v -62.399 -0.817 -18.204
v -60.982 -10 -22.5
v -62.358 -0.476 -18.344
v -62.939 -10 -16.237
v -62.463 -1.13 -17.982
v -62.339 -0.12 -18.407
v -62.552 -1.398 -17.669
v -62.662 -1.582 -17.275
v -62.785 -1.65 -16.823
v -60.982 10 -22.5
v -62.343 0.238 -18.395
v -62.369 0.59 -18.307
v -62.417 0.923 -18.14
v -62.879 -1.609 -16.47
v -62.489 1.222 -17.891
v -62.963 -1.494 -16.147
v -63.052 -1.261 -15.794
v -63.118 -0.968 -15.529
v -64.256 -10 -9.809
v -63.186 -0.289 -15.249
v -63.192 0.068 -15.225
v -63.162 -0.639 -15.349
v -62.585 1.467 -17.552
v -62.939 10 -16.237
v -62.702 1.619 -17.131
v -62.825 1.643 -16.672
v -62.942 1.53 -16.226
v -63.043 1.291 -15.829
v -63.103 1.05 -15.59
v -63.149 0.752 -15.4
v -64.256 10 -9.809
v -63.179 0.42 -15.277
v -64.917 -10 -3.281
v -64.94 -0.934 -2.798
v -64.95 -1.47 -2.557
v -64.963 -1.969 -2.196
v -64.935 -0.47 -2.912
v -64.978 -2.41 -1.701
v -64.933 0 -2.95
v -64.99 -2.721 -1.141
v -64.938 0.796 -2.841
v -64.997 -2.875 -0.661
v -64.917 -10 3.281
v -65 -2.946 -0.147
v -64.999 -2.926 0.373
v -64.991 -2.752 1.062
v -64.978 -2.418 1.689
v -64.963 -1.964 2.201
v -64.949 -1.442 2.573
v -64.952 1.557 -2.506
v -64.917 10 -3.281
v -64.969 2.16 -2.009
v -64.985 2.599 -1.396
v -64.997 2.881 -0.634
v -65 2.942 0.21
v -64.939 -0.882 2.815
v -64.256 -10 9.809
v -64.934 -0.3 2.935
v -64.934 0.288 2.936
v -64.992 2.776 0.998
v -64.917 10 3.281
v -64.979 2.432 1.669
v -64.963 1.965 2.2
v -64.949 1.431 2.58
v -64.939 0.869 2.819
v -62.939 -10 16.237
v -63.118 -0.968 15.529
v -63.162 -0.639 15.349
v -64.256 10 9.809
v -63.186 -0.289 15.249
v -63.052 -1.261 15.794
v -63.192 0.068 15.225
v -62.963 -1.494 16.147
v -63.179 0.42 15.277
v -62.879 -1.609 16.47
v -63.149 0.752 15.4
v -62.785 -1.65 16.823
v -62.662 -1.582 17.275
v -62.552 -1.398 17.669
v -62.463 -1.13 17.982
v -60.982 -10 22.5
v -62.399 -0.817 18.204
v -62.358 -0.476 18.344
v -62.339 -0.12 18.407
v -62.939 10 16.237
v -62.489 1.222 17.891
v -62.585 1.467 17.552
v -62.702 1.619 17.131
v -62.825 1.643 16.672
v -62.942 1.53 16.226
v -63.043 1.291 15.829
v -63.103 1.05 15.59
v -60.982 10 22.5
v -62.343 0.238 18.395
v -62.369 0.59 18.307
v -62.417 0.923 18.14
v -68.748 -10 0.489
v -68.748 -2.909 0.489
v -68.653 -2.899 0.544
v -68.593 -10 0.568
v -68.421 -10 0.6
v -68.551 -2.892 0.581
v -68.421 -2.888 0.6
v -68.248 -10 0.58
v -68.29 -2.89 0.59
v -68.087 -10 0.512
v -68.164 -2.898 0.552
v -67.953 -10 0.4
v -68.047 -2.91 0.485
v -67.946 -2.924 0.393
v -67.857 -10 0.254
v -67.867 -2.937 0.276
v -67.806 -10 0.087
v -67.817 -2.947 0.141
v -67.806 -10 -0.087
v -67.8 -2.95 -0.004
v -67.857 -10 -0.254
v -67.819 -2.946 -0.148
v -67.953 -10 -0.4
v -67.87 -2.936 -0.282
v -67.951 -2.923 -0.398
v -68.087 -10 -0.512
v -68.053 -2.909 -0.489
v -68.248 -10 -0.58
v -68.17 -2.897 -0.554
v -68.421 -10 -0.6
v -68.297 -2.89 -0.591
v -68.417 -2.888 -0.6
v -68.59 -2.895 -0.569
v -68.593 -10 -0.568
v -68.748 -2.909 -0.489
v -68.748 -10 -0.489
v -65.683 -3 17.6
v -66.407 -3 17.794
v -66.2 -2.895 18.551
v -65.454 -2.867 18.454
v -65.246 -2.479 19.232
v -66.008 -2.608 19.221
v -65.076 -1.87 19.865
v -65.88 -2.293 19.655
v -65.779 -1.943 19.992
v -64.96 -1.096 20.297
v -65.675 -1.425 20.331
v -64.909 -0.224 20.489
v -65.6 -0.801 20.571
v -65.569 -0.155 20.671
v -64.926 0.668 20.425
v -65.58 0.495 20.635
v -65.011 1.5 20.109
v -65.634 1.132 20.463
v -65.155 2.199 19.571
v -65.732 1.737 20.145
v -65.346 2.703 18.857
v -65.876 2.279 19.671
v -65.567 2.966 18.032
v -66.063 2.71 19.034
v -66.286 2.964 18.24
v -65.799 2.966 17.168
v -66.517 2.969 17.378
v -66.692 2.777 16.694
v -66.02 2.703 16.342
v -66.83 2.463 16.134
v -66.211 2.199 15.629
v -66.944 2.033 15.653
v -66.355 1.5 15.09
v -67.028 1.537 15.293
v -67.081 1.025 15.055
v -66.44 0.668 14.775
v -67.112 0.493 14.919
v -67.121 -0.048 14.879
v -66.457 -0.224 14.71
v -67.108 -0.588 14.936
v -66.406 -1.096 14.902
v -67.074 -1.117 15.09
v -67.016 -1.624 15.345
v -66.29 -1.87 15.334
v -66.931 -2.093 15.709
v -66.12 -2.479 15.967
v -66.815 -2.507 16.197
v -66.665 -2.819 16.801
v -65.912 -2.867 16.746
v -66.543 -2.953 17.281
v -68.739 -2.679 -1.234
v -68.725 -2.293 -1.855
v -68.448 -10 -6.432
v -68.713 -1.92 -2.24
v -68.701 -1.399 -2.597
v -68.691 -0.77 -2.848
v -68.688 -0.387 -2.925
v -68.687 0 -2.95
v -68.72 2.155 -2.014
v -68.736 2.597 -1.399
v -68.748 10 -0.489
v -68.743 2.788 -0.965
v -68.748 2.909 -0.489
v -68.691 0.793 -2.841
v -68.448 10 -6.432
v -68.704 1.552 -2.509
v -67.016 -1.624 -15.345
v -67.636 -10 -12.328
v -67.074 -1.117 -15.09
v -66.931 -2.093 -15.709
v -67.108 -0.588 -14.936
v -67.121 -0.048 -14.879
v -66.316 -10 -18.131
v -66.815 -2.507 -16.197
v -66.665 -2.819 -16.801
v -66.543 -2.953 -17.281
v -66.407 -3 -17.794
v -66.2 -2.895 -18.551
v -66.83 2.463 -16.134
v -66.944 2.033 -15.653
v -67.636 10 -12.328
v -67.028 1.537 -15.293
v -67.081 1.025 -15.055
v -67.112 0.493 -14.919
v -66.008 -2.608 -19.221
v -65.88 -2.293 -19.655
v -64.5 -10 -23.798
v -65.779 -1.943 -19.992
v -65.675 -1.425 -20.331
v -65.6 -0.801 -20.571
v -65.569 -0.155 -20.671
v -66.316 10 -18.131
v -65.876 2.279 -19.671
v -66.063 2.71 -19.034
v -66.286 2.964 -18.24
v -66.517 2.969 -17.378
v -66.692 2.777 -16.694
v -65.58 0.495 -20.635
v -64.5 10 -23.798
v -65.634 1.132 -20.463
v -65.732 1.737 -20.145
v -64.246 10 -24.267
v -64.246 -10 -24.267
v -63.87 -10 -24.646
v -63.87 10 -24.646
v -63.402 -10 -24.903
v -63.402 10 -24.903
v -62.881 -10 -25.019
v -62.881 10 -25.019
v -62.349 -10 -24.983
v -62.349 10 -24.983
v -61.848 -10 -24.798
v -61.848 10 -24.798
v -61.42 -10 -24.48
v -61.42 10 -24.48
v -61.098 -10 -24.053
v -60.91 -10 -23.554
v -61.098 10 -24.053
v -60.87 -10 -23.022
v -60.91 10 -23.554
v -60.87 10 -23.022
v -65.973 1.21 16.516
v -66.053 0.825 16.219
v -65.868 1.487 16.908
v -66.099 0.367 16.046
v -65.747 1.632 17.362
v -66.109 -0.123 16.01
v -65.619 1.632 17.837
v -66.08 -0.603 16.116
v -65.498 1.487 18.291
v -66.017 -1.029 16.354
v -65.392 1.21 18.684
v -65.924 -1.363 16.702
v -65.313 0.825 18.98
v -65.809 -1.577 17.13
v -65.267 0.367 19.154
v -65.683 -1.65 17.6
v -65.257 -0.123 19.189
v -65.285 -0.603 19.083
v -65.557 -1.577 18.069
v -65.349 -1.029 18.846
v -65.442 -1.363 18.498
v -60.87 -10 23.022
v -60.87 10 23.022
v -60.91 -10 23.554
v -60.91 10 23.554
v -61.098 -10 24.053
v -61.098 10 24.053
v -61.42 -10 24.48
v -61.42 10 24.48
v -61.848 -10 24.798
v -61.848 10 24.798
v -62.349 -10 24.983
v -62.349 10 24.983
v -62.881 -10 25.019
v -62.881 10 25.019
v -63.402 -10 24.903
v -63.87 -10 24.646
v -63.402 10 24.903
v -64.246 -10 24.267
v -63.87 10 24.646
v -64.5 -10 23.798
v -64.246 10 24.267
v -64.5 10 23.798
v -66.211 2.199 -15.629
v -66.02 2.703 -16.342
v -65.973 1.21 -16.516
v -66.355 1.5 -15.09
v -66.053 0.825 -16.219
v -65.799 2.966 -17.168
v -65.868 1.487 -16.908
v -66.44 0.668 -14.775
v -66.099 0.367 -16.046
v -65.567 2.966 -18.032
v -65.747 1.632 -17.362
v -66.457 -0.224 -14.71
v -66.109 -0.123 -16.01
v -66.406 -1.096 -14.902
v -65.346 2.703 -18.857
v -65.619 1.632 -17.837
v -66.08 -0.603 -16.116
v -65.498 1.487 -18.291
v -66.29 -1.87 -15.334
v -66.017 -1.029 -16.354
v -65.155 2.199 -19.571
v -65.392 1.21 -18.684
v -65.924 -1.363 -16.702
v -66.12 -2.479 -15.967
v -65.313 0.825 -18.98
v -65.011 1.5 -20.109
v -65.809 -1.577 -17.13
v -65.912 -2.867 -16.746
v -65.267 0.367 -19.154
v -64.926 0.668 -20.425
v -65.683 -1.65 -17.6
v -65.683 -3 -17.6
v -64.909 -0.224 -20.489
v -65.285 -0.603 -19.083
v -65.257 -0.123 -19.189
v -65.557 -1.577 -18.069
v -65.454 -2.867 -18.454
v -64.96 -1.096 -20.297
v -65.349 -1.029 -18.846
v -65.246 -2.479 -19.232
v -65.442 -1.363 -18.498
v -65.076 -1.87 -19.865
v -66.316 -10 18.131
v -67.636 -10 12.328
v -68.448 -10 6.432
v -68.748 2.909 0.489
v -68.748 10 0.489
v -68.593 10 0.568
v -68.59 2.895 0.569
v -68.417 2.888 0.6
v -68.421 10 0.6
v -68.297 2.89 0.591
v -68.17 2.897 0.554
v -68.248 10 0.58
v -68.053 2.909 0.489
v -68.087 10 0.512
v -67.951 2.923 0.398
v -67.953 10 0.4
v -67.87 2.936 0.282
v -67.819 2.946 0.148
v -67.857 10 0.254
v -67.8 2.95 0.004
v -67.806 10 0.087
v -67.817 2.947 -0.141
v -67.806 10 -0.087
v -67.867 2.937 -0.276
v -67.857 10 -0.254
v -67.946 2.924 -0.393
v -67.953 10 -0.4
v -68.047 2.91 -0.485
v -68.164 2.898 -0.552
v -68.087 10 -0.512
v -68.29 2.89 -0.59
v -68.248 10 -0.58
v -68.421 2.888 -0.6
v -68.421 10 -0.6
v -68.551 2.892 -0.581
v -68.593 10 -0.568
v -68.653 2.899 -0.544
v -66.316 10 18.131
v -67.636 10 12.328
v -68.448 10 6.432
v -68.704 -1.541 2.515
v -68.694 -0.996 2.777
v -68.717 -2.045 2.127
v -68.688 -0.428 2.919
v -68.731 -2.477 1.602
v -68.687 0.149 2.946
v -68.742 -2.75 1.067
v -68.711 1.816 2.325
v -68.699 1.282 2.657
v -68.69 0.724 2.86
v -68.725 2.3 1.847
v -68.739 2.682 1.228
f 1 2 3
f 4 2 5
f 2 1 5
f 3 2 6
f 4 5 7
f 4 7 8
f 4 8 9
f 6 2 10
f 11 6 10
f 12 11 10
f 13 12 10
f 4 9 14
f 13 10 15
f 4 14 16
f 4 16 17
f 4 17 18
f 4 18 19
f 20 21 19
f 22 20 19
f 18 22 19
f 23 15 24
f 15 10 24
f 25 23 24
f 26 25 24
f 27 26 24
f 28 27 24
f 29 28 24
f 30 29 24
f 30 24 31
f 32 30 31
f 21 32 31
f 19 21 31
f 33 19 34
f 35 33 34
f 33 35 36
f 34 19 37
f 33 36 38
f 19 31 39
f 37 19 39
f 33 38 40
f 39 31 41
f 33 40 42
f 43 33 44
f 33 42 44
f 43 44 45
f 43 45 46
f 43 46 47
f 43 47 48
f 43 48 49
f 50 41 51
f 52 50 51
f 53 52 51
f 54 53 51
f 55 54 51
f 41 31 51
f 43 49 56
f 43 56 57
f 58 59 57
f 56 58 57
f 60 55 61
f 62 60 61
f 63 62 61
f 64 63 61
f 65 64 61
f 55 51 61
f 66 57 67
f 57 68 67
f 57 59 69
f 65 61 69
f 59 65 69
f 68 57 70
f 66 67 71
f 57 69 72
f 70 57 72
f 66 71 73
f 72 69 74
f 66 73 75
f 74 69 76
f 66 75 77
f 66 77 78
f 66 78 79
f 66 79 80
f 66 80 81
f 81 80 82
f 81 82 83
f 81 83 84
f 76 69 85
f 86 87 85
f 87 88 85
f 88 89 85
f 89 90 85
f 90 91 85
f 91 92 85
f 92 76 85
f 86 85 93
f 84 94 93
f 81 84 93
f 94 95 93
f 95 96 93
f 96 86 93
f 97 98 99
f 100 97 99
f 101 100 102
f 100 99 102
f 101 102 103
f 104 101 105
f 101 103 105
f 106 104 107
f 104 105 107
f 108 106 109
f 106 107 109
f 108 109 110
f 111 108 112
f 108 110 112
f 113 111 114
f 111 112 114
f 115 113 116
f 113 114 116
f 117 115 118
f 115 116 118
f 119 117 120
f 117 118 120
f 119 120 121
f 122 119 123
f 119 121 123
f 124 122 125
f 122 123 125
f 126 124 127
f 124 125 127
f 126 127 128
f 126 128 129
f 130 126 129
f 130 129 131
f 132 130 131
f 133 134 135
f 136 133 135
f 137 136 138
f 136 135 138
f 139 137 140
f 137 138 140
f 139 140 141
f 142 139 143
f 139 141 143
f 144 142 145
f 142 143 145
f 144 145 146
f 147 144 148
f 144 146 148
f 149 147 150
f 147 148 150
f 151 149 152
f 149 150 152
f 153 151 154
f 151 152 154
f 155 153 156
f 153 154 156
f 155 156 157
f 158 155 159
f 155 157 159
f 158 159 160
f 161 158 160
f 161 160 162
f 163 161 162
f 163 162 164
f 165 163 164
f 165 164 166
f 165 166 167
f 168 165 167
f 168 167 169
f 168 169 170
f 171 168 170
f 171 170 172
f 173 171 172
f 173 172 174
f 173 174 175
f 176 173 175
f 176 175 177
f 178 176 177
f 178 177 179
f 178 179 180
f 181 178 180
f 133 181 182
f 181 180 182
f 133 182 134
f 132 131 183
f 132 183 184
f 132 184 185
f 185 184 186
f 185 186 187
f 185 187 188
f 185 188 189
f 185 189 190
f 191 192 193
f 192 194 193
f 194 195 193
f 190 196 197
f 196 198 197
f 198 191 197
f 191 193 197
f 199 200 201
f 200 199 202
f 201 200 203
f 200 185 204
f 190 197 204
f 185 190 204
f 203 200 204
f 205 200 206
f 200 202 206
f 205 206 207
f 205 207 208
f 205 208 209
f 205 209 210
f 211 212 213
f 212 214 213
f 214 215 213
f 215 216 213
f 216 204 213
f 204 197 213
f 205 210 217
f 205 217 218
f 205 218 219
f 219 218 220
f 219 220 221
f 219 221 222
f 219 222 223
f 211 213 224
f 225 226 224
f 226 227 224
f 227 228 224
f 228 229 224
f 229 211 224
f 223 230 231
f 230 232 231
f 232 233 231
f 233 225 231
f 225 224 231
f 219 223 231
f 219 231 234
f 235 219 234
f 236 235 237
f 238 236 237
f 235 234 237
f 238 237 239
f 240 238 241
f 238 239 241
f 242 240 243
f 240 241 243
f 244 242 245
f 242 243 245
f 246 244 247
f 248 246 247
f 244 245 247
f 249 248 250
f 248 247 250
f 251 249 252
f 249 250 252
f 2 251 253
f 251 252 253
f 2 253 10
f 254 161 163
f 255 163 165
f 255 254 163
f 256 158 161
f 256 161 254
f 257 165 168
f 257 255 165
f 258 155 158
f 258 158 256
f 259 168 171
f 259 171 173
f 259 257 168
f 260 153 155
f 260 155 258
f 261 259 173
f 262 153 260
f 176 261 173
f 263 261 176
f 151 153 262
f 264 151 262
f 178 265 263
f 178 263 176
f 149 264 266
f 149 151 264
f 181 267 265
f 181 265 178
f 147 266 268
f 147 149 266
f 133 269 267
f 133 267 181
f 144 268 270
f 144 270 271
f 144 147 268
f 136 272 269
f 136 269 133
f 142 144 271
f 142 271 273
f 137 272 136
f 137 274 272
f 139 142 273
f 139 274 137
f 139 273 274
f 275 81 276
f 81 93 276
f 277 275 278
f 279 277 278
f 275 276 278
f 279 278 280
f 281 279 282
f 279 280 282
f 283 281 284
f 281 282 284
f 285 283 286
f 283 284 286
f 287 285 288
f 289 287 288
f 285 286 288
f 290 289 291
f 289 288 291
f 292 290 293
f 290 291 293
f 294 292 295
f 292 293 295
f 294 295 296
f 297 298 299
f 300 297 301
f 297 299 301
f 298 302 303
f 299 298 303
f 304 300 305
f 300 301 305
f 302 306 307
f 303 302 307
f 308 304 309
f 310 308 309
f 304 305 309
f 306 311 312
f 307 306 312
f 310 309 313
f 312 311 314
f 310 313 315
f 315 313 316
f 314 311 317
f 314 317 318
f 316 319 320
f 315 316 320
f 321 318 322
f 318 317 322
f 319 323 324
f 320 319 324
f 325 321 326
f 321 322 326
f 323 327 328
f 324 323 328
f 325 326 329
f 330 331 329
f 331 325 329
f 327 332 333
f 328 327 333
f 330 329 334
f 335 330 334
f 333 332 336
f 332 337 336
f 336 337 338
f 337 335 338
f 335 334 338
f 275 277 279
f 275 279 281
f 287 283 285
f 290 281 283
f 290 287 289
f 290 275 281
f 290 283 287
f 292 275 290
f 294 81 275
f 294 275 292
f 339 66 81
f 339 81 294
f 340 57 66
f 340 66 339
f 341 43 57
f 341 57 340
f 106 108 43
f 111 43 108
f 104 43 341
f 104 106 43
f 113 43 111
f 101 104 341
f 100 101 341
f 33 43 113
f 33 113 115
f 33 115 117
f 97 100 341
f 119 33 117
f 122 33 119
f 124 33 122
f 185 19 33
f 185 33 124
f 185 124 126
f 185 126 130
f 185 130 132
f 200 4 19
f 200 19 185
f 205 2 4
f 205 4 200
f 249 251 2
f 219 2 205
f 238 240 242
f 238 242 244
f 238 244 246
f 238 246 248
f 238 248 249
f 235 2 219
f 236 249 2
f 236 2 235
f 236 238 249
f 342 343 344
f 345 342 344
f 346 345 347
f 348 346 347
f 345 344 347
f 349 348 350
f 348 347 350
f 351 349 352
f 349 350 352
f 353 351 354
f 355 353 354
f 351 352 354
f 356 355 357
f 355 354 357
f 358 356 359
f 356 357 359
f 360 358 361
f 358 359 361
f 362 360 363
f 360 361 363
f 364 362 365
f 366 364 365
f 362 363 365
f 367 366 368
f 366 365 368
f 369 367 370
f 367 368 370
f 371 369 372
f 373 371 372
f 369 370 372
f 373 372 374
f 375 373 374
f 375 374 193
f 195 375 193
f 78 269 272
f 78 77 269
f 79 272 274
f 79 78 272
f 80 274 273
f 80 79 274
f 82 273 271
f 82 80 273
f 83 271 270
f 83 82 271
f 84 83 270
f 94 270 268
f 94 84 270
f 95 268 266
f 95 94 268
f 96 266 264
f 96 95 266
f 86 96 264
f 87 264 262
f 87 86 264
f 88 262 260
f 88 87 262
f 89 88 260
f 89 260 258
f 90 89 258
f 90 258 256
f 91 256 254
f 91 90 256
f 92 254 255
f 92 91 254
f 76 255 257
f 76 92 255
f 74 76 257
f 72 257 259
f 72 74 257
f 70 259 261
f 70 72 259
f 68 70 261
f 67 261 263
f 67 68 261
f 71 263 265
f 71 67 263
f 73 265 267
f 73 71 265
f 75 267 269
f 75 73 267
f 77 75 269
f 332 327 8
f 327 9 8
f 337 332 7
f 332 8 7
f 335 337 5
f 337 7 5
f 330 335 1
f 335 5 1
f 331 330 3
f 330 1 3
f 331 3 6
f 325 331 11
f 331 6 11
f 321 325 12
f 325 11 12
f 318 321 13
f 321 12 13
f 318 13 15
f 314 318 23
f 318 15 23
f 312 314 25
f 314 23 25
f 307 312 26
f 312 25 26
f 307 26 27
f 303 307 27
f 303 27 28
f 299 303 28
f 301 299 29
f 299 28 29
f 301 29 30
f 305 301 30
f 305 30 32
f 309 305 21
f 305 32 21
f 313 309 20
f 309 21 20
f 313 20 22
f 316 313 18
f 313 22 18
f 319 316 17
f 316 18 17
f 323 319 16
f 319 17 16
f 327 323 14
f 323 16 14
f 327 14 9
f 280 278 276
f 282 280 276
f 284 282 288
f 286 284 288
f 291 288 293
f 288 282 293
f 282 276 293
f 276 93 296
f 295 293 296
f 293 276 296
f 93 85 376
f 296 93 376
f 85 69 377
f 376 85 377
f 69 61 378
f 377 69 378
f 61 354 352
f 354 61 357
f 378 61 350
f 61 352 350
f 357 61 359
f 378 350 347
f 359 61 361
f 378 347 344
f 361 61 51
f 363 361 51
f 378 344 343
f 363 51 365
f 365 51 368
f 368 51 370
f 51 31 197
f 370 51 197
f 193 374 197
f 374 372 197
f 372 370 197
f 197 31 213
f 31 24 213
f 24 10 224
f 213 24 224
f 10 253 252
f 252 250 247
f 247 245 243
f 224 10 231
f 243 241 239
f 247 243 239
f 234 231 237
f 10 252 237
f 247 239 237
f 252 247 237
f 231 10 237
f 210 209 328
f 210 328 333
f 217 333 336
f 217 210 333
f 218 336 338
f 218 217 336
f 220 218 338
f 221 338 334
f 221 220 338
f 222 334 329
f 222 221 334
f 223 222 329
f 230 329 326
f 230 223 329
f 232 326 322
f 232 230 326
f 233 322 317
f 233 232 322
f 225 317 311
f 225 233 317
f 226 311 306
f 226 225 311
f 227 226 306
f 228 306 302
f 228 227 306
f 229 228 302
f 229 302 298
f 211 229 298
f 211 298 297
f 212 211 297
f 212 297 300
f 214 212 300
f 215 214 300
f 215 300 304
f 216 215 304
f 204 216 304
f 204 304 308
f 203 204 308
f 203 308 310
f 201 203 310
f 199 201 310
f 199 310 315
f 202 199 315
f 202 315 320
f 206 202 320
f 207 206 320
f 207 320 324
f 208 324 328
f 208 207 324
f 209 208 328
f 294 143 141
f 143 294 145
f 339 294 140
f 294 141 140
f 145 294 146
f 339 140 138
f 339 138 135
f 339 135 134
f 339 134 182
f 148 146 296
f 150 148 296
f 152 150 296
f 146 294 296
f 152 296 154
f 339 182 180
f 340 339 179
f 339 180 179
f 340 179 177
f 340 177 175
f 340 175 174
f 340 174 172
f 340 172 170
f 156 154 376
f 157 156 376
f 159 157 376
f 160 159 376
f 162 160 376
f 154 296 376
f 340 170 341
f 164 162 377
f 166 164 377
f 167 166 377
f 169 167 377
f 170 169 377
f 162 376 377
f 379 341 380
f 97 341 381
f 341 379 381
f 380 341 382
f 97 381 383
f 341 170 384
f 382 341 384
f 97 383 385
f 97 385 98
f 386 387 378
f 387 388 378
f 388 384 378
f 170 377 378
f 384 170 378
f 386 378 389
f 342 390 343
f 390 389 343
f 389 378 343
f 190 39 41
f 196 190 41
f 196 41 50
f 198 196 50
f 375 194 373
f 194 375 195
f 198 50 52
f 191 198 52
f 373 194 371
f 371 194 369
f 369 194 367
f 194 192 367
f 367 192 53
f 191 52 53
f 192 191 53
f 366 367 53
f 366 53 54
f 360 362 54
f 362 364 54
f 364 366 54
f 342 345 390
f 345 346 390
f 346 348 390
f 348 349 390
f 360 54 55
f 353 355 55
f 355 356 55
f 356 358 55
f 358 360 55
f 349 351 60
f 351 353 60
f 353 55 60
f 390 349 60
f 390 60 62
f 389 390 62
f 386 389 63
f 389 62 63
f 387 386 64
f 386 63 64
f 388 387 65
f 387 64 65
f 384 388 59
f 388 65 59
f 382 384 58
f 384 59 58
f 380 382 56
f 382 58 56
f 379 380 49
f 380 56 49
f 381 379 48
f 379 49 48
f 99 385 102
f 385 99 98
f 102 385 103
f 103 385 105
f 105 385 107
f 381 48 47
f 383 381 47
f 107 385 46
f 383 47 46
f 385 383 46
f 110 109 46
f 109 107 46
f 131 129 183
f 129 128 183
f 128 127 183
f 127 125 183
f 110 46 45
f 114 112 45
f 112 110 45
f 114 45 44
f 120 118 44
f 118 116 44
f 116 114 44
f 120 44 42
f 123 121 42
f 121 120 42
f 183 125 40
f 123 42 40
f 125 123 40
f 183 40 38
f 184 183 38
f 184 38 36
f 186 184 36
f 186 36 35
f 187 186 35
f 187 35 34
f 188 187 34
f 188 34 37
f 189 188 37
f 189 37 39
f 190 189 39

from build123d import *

# Parameters (mm, degrees)
BOSS_EXTRUDE2_DEPTH = 10
SKETCH9_R           = 1.65
CUT_EXTRUDE3_DEPTH  = 10
SKETCH10_R          = 2.95
CUT_EXTRUDE4_DEPTH  = 74.842839982
SKETCH12_R          = 3
CUT_EXTRUDE5_DEPTH  = 2
SKETCH13_R          = 0.6
CUT_EXTRUDE6_DEPTH  = 76.846984244


with BuildPart() as part:
    # Sketch3 → Boss-Extrude2 (new, symmetric)
    with BuildSketch(Plane(origin=(0, 0, 0), x_dir=(1, 0, 0), z_dir=(0, 1, 0))):
        with BuildLine():
            ThreePointArc((-60.981554588, 22.5), (-65, 0), (-60.981554588, -22.5))
            ThreePointArc((-60.981554588, -22.5), (-62.091599432, -24.908121767), (-64.499721199, -23.798076923))
            ThreePointArc((-64.499721199, -23.798076923), (-68.75, 0), (-64.499721199, 23.798076923))
            ThreePointArc((-64.499721199, 23.798076923), (-62.091599432, 24.908121767), (-60.981554588, 22.5))
        make_face()
    extrude(amount=BOSS_EXTRUDE2_DEPTH, both=True)

    # Sketch9 → Cut-Extrude3 (cut, symmetric)
    with BuildSketch(Plane(origin=(-62.785178709, 0, -16.823237932), x_dir=(0, -1, 0), z_dir=(0.9659258262890673, 0, 0.25881904510252474))):
        Circle(SKETCH9_R)
    cut_extrude3 = extrude(amount=CUT_EXTRUDE3_DEPTH, both=True, mode=Mode.SUBTRACT)

    # Mirror1: Cut-Extrude3 across plane
    add(cut_extrude3.mirror(Plane.XY), mode=Mode.SUBTRACT)

    # Sketch10 → Cut-Extrude4 (cut, through all)
    with BuildSketch(Plane(origin=(0, 0, 0), x_dir=(0, 0, -1), z_dir=(1, 0, 0))):
        Circle(SKETCH10_R)
    extrude(amount=-CUT_EXTRUDE4_DEPTH, mode=Mode.SUBTRACT)

    # Sketch12 → Cut-Extrude5 (cut)
    with BuildSketch(Plane(origin=(-67.61480784, 0, -18.117333157), x_dir=(0, -1, 0), z_dir=(0.9659258262890673, 0, 0.25881904510252474))):
        Circle(SKETCH12_R)
    cut_extrude5 = extrude(amount=CUT_EXTRUDE5_DEPTH, mode=Mode.SUBTRACT)

    # Mirror2: Cut-Extrude5 across plane
    add(cut_extrude5.mirror(Plane.XY), mode=Mode.SUBTRACT)

    # Sketch13 → Cut-Extrude6 (cut, through all)
    with BuildSketch(Plane(origin=(0, 10, 0), x_dir=(1, 0, 0), z_dir=(0, 1, 0))):
        with Locations((-68.4, 0)):
            Circle(SKETCH13_R)
    extrude(amount=-CUT_EXTRUDE6_DEPTH, mode=Mode.SUBTRACT)


solid = part.part
